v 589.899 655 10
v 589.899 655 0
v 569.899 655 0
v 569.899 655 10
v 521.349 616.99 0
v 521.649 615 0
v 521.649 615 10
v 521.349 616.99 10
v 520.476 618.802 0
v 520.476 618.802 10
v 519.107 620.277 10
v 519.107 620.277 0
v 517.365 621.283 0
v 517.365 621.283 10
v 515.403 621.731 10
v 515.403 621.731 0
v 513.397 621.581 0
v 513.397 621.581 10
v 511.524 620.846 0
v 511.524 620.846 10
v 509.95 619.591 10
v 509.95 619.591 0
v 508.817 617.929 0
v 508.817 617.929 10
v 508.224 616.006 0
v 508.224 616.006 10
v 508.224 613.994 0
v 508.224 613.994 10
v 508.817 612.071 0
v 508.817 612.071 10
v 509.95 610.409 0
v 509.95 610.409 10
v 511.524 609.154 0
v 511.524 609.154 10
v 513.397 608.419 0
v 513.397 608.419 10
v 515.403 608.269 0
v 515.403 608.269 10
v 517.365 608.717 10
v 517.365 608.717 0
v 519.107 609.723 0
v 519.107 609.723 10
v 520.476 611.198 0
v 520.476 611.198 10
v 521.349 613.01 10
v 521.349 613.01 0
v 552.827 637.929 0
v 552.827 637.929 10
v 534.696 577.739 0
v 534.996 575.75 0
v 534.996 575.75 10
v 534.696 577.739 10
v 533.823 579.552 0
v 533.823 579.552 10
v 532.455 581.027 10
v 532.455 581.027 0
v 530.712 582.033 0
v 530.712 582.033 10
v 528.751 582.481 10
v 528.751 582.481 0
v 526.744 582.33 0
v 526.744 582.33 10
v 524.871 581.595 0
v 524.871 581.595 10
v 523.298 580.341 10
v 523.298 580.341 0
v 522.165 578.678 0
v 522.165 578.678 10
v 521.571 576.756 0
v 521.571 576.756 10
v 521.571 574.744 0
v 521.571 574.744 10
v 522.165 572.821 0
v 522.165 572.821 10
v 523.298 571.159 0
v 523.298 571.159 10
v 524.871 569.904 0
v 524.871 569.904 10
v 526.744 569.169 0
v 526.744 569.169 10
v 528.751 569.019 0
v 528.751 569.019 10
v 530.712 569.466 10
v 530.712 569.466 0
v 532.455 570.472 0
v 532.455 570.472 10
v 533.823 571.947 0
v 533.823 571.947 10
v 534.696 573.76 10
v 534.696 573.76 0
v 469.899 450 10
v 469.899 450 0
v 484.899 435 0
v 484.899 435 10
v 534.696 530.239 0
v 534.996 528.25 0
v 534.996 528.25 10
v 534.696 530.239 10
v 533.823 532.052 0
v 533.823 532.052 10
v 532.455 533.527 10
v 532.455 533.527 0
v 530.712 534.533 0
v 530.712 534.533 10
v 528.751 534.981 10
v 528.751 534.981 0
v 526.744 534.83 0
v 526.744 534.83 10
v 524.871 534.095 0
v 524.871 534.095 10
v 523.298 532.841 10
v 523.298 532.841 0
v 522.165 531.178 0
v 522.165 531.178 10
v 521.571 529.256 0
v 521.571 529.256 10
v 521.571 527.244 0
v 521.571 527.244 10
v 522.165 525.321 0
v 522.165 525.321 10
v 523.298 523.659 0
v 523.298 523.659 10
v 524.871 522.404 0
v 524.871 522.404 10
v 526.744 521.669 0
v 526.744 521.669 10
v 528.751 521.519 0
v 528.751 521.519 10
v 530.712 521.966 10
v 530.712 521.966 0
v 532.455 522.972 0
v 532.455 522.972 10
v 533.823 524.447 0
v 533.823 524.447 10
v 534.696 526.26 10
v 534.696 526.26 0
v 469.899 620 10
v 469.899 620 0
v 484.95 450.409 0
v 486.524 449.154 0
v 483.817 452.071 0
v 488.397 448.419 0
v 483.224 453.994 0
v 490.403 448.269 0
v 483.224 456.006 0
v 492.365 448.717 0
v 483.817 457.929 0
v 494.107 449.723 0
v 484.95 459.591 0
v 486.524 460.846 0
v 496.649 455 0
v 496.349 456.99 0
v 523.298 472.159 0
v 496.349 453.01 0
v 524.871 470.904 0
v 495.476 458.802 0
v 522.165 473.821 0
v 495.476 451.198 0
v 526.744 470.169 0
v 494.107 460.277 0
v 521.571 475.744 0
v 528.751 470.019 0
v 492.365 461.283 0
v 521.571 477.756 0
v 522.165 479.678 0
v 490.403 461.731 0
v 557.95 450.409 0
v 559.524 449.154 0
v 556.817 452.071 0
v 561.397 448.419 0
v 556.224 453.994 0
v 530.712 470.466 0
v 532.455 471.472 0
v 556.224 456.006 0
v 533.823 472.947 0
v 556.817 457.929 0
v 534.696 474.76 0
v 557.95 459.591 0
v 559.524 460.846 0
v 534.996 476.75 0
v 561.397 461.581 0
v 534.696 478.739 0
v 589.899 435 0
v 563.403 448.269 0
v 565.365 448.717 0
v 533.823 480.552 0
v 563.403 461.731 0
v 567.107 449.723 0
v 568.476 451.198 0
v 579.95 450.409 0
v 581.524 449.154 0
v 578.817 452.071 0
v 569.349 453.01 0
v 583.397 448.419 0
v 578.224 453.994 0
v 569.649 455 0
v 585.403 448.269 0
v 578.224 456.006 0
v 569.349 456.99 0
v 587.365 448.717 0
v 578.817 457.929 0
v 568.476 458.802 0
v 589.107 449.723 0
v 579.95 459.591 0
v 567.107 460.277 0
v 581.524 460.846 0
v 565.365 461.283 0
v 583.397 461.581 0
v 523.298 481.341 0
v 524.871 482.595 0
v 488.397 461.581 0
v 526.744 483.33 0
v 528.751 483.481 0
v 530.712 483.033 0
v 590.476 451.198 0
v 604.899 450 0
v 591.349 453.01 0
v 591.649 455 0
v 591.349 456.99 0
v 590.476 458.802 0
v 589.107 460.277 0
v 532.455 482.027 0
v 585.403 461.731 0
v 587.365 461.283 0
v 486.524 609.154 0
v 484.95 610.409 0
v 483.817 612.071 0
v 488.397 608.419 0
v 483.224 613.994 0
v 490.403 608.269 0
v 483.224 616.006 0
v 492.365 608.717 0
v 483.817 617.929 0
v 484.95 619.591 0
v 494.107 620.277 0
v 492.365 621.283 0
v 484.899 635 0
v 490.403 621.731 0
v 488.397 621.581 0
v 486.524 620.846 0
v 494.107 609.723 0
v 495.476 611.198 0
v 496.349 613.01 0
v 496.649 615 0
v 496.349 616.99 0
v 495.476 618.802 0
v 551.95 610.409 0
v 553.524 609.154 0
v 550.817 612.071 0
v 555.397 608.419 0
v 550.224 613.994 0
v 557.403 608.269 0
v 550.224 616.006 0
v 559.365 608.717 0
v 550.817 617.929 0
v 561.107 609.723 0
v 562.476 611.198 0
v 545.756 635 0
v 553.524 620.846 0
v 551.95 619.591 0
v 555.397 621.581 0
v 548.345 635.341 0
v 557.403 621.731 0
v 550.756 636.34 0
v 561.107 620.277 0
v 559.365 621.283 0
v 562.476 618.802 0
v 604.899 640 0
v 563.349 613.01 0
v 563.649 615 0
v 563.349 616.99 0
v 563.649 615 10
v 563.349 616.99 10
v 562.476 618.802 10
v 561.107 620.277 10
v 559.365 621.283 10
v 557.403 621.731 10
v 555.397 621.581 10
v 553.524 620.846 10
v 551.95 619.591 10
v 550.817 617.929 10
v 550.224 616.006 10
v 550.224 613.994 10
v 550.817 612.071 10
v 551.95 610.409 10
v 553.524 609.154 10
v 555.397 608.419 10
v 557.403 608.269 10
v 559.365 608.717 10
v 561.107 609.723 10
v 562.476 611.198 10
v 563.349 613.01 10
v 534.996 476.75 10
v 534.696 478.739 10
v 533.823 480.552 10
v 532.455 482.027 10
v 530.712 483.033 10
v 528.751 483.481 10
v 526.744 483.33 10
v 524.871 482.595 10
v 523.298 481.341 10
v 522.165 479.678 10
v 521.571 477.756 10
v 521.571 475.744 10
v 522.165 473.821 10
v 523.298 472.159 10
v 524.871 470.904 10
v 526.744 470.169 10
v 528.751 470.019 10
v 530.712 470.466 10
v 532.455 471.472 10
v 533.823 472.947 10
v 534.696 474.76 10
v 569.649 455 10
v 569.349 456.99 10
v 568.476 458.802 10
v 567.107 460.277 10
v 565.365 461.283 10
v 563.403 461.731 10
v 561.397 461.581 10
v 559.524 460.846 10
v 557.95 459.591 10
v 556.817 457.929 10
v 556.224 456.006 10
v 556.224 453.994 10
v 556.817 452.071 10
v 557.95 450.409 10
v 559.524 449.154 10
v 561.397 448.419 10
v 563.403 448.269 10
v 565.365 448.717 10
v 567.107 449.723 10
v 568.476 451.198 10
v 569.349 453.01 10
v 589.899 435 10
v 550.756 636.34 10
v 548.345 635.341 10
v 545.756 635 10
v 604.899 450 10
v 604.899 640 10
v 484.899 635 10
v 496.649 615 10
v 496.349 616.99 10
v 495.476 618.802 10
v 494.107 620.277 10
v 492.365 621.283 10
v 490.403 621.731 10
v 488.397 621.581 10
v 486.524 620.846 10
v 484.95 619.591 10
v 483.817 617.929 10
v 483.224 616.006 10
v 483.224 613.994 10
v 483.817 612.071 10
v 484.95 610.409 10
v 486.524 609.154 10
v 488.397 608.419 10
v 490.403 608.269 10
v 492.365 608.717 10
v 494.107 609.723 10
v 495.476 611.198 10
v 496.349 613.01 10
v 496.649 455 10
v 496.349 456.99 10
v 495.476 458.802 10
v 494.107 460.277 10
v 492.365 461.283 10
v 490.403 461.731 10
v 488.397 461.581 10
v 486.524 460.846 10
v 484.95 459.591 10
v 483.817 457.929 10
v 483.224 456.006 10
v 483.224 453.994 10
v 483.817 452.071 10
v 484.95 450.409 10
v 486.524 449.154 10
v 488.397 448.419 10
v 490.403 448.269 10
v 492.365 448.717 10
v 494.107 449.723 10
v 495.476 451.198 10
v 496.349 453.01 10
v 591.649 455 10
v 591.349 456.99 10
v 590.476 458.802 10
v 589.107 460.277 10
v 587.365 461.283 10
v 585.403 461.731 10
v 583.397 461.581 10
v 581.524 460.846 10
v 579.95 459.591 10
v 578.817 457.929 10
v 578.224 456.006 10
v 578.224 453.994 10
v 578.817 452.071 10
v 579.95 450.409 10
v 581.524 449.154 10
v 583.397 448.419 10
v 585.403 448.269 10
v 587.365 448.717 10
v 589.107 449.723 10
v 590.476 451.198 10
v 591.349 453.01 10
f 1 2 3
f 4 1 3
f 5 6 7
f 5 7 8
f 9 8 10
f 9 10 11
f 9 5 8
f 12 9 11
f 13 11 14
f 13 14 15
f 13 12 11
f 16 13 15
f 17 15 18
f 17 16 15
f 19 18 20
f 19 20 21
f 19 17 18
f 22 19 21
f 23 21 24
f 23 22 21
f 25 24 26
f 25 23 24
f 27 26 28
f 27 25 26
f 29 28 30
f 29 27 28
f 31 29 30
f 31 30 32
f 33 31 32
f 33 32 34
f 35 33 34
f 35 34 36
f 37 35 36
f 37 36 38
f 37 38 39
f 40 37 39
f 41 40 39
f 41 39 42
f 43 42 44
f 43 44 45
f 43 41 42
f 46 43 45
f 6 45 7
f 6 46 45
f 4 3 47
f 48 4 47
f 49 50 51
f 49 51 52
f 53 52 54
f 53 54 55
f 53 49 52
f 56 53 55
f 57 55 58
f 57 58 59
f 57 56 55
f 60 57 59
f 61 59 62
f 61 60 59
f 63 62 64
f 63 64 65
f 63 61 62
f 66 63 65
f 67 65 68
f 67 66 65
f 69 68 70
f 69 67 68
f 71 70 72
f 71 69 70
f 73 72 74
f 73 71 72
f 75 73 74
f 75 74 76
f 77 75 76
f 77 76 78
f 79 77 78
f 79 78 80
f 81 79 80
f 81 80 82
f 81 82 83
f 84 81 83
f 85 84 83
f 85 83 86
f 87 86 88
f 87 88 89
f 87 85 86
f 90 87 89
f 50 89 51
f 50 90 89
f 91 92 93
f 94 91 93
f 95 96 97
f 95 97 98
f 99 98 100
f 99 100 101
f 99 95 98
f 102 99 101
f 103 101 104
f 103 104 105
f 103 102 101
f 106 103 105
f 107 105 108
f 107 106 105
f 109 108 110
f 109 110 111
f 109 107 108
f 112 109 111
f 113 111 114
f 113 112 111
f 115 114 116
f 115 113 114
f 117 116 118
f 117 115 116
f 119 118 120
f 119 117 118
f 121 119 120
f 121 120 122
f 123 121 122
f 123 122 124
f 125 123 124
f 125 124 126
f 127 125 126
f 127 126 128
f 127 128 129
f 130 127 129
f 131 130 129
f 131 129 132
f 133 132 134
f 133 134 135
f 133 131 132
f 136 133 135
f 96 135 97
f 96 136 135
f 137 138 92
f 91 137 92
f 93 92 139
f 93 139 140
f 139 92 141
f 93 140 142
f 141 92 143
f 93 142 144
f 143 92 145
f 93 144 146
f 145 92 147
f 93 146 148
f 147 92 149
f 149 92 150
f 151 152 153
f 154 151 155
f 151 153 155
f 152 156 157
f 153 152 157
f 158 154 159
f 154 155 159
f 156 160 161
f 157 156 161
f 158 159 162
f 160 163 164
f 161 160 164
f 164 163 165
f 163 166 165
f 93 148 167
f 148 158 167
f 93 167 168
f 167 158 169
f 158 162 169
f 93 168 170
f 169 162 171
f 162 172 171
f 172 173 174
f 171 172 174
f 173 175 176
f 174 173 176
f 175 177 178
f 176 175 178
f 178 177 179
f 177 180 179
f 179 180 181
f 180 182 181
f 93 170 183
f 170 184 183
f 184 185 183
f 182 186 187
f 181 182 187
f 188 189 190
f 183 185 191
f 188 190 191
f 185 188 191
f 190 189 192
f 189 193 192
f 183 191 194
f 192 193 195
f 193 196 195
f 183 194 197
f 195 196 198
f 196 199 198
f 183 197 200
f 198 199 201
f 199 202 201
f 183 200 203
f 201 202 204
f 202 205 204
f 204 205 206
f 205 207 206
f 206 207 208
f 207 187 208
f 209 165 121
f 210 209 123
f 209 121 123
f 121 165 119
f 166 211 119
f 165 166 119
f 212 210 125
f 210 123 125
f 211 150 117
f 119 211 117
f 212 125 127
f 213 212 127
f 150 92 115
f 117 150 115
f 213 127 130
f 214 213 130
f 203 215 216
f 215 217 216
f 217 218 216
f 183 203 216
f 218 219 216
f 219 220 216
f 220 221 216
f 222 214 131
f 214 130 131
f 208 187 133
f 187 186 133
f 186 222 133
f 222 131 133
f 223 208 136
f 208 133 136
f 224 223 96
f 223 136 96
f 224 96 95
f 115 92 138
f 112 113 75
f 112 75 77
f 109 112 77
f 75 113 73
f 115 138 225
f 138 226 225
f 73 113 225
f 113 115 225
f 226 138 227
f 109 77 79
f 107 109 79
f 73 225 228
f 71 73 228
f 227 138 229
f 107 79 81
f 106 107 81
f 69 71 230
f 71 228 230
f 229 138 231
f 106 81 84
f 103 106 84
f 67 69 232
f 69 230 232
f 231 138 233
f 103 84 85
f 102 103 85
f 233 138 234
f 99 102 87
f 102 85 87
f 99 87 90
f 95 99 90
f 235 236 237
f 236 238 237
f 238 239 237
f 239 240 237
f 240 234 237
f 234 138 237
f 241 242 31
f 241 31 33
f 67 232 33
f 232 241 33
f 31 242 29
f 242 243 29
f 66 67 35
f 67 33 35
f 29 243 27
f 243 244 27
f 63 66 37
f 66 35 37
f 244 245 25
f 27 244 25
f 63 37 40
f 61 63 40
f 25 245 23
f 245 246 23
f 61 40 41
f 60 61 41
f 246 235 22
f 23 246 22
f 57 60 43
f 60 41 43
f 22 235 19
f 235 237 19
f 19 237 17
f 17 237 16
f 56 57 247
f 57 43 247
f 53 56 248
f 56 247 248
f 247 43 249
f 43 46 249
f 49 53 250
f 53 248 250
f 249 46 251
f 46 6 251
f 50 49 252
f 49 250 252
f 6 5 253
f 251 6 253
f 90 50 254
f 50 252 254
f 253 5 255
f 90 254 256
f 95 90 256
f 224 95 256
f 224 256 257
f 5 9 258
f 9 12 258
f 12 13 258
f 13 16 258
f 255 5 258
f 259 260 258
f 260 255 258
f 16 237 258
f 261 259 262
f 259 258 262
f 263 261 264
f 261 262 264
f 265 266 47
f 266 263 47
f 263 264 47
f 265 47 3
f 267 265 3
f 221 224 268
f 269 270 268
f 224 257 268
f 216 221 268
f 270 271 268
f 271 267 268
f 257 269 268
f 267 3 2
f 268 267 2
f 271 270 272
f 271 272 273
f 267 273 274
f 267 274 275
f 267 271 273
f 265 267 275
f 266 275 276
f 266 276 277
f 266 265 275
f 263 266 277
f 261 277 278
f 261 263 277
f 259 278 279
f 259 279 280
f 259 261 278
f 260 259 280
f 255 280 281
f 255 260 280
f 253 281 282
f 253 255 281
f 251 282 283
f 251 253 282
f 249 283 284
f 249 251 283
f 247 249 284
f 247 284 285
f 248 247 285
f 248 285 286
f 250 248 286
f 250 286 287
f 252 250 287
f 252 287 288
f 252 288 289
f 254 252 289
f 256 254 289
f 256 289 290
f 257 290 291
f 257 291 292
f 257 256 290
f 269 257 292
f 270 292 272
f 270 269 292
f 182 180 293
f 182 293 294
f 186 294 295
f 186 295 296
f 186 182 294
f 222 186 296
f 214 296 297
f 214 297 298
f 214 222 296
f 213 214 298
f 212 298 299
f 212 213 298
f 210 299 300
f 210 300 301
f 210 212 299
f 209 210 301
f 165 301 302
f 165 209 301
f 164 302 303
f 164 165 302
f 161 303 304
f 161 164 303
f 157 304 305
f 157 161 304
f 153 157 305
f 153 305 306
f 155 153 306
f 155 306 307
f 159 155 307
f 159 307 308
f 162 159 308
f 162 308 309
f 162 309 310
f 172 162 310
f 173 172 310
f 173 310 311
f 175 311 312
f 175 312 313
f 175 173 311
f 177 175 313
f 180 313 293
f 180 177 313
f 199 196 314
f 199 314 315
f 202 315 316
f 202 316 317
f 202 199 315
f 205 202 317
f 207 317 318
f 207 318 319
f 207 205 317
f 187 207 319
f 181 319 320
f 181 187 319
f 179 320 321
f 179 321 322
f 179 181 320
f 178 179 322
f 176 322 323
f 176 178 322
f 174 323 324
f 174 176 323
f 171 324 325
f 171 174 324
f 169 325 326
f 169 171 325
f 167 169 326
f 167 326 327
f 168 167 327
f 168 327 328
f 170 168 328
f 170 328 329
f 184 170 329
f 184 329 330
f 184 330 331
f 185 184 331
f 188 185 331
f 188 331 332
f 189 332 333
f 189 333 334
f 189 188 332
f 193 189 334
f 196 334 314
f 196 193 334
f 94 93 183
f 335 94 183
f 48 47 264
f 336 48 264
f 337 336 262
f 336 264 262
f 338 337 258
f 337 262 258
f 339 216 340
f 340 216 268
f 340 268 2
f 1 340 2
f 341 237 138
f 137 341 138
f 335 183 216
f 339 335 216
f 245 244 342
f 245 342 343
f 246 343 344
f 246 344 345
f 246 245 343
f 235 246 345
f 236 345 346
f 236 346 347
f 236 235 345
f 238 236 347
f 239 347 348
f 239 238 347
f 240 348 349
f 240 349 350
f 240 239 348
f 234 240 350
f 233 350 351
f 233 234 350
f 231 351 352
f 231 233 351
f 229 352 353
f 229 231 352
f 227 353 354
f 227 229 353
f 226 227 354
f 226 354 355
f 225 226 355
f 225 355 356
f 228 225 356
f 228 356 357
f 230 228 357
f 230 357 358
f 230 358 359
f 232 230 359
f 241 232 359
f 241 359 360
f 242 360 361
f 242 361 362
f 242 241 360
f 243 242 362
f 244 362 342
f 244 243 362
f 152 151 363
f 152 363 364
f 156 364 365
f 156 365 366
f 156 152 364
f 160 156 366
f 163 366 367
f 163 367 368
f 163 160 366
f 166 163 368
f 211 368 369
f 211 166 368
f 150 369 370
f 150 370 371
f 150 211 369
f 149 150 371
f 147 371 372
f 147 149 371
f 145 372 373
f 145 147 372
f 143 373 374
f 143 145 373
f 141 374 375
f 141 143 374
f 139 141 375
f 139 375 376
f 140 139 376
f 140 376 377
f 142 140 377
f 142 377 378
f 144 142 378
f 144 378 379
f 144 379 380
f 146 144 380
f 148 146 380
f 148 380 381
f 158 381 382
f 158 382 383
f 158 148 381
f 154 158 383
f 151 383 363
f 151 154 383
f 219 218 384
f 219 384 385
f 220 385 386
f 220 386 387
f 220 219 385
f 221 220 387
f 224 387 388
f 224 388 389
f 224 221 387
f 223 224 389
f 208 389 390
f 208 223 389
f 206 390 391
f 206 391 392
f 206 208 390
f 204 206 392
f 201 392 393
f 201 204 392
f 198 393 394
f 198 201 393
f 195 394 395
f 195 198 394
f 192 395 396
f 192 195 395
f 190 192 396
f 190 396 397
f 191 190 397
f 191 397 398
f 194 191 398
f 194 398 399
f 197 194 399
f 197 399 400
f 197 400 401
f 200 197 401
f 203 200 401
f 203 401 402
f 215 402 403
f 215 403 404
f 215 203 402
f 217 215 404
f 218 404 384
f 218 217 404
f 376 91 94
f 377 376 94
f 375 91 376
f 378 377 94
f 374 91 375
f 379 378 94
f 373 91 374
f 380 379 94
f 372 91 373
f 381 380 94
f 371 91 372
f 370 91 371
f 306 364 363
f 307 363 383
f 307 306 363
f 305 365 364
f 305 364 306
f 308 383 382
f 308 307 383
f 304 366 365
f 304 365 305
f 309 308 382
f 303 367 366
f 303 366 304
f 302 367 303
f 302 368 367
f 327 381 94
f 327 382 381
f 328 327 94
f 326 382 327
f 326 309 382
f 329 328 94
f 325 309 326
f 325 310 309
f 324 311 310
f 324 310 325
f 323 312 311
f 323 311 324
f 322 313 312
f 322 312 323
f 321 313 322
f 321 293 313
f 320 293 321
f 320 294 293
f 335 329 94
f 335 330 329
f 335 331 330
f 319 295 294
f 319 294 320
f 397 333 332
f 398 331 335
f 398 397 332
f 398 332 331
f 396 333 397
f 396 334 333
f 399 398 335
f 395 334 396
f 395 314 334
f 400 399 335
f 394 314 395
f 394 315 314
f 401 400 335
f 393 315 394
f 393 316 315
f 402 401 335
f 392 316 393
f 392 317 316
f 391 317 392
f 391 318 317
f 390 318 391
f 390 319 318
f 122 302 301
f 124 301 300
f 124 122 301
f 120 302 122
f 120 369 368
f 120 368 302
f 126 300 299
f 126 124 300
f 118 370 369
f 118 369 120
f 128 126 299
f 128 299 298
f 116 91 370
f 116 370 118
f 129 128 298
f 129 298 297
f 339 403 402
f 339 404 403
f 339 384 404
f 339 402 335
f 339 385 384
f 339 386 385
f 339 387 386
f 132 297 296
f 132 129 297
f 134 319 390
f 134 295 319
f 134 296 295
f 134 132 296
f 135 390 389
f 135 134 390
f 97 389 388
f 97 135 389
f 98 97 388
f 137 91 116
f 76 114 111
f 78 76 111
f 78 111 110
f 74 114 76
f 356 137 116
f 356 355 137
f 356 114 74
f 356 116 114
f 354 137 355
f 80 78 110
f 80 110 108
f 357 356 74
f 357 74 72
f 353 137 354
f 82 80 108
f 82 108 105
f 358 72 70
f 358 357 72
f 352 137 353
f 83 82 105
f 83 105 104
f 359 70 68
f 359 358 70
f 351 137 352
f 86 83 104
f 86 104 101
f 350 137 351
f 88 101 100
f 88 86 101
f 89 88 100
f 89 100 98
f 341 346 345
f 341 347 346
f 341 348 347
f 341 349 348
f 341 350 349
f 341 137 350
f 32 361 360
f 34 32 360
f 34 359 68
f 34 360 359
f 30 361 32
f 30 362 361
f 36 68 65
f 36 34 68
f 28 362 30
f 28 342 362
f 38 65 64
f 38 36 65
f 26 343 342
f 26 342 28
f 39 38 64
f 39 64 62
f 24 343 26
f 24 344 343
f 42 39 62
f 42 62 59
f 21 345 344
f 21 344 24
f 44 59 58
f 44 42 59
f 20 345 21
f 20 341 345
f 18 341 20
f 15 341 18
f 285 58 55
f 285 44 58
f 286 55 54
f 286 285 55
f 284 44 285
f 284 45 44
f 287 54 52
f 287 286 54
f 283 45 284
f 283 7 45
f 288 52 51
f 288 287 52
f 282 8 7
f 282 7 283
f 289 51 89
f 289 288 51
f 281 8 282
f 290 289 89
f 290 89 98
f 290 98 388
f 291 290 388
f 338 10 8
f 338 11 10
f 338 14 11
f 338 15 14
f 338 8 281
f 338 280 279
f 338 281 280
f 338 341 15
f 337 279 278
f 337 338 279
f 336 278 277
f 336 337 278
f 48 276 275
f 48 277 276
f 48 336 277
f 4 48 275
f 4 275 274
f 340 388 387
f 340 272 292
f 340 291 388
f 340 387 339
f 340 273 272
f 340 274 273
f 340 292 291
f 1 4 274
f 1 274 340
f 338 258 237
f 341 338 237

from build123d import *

# Parameters (mm, degrees)
SKETCH_1_R      = 6.75
EXTRUDE_1_DEPTH = 10


with BuildPart() as part:
    # Эскиз1 → Бобышка-Вытянуть1 (new body)
    with BuildSketch(Plane.XY):
        with BuildLine():
            Line((469.898536303, 620), (469.898536303, 450))
            Line((469.898536303, 450), (484.898536303, 435))
            Line((484.898536303, 435), (589.898536303, 435))
            Line((589.898536303, 435), (604.898536303, 450))
            Line((604.898536303, 450), (604.898536303, 640))
            Line((604.898536303, 640), (589.898536303, 655))
            Line((589.898536303, 655), (569.898536303, 655))
            Line((569.898536303, 655), (552.827468491, 637.928932188))
            ThreePointArc((552.827468491, 637.928932188), (549.583235002, 635.761204675), (545.756400679, 635))
            Line((545.756400679, 635), (484.898536303, 635))
            Line((484.898536303, 635), (469.898536303, 620))
        make_face()
        with Locations((584.898536303, 455)):
            Circle(SKETCH_1_R, mode=Mode.SUBTRACT)
        with Locations((562.898536303, 455)):
            Circle(SKETCH_1_R, mode=Mode.SUBTRACT)
        with Locations((489.898536303, 455)):
            Circle(SKETCH_1_R, mode=Mode.SUBTRACT)
        with Locations((528.246102145, 476.749727554)):
            Circle(SKETCH_1_R, mode=Mode.SUBTRACT)
        with Locations((528.246102144, 528.249727554)):
            Circle(SKETCH_1_R, mode=Mode.SUBTRACT)
        with Locations((528.246102143, 575.749727554)):
            Circle(SKETCH_1_R, mode=Mode.SUBTRACT)
        with Locations((514.898536303, 615)):
            Circle(SKETCH_1_R, mode=Mode.SUBTRACT)
        with Locations((489.898536303, 615)):
            Circle(SKETCH_1_R, mode=Mode.SUBTRACT)
        with Locations((556.898536303, 615)):
            Circle(SKETCH_1_R, mode=Mode.SUBTRACT)
    extrude(amount=EXTRUDE_1_DEPTH)


solid = part.part
